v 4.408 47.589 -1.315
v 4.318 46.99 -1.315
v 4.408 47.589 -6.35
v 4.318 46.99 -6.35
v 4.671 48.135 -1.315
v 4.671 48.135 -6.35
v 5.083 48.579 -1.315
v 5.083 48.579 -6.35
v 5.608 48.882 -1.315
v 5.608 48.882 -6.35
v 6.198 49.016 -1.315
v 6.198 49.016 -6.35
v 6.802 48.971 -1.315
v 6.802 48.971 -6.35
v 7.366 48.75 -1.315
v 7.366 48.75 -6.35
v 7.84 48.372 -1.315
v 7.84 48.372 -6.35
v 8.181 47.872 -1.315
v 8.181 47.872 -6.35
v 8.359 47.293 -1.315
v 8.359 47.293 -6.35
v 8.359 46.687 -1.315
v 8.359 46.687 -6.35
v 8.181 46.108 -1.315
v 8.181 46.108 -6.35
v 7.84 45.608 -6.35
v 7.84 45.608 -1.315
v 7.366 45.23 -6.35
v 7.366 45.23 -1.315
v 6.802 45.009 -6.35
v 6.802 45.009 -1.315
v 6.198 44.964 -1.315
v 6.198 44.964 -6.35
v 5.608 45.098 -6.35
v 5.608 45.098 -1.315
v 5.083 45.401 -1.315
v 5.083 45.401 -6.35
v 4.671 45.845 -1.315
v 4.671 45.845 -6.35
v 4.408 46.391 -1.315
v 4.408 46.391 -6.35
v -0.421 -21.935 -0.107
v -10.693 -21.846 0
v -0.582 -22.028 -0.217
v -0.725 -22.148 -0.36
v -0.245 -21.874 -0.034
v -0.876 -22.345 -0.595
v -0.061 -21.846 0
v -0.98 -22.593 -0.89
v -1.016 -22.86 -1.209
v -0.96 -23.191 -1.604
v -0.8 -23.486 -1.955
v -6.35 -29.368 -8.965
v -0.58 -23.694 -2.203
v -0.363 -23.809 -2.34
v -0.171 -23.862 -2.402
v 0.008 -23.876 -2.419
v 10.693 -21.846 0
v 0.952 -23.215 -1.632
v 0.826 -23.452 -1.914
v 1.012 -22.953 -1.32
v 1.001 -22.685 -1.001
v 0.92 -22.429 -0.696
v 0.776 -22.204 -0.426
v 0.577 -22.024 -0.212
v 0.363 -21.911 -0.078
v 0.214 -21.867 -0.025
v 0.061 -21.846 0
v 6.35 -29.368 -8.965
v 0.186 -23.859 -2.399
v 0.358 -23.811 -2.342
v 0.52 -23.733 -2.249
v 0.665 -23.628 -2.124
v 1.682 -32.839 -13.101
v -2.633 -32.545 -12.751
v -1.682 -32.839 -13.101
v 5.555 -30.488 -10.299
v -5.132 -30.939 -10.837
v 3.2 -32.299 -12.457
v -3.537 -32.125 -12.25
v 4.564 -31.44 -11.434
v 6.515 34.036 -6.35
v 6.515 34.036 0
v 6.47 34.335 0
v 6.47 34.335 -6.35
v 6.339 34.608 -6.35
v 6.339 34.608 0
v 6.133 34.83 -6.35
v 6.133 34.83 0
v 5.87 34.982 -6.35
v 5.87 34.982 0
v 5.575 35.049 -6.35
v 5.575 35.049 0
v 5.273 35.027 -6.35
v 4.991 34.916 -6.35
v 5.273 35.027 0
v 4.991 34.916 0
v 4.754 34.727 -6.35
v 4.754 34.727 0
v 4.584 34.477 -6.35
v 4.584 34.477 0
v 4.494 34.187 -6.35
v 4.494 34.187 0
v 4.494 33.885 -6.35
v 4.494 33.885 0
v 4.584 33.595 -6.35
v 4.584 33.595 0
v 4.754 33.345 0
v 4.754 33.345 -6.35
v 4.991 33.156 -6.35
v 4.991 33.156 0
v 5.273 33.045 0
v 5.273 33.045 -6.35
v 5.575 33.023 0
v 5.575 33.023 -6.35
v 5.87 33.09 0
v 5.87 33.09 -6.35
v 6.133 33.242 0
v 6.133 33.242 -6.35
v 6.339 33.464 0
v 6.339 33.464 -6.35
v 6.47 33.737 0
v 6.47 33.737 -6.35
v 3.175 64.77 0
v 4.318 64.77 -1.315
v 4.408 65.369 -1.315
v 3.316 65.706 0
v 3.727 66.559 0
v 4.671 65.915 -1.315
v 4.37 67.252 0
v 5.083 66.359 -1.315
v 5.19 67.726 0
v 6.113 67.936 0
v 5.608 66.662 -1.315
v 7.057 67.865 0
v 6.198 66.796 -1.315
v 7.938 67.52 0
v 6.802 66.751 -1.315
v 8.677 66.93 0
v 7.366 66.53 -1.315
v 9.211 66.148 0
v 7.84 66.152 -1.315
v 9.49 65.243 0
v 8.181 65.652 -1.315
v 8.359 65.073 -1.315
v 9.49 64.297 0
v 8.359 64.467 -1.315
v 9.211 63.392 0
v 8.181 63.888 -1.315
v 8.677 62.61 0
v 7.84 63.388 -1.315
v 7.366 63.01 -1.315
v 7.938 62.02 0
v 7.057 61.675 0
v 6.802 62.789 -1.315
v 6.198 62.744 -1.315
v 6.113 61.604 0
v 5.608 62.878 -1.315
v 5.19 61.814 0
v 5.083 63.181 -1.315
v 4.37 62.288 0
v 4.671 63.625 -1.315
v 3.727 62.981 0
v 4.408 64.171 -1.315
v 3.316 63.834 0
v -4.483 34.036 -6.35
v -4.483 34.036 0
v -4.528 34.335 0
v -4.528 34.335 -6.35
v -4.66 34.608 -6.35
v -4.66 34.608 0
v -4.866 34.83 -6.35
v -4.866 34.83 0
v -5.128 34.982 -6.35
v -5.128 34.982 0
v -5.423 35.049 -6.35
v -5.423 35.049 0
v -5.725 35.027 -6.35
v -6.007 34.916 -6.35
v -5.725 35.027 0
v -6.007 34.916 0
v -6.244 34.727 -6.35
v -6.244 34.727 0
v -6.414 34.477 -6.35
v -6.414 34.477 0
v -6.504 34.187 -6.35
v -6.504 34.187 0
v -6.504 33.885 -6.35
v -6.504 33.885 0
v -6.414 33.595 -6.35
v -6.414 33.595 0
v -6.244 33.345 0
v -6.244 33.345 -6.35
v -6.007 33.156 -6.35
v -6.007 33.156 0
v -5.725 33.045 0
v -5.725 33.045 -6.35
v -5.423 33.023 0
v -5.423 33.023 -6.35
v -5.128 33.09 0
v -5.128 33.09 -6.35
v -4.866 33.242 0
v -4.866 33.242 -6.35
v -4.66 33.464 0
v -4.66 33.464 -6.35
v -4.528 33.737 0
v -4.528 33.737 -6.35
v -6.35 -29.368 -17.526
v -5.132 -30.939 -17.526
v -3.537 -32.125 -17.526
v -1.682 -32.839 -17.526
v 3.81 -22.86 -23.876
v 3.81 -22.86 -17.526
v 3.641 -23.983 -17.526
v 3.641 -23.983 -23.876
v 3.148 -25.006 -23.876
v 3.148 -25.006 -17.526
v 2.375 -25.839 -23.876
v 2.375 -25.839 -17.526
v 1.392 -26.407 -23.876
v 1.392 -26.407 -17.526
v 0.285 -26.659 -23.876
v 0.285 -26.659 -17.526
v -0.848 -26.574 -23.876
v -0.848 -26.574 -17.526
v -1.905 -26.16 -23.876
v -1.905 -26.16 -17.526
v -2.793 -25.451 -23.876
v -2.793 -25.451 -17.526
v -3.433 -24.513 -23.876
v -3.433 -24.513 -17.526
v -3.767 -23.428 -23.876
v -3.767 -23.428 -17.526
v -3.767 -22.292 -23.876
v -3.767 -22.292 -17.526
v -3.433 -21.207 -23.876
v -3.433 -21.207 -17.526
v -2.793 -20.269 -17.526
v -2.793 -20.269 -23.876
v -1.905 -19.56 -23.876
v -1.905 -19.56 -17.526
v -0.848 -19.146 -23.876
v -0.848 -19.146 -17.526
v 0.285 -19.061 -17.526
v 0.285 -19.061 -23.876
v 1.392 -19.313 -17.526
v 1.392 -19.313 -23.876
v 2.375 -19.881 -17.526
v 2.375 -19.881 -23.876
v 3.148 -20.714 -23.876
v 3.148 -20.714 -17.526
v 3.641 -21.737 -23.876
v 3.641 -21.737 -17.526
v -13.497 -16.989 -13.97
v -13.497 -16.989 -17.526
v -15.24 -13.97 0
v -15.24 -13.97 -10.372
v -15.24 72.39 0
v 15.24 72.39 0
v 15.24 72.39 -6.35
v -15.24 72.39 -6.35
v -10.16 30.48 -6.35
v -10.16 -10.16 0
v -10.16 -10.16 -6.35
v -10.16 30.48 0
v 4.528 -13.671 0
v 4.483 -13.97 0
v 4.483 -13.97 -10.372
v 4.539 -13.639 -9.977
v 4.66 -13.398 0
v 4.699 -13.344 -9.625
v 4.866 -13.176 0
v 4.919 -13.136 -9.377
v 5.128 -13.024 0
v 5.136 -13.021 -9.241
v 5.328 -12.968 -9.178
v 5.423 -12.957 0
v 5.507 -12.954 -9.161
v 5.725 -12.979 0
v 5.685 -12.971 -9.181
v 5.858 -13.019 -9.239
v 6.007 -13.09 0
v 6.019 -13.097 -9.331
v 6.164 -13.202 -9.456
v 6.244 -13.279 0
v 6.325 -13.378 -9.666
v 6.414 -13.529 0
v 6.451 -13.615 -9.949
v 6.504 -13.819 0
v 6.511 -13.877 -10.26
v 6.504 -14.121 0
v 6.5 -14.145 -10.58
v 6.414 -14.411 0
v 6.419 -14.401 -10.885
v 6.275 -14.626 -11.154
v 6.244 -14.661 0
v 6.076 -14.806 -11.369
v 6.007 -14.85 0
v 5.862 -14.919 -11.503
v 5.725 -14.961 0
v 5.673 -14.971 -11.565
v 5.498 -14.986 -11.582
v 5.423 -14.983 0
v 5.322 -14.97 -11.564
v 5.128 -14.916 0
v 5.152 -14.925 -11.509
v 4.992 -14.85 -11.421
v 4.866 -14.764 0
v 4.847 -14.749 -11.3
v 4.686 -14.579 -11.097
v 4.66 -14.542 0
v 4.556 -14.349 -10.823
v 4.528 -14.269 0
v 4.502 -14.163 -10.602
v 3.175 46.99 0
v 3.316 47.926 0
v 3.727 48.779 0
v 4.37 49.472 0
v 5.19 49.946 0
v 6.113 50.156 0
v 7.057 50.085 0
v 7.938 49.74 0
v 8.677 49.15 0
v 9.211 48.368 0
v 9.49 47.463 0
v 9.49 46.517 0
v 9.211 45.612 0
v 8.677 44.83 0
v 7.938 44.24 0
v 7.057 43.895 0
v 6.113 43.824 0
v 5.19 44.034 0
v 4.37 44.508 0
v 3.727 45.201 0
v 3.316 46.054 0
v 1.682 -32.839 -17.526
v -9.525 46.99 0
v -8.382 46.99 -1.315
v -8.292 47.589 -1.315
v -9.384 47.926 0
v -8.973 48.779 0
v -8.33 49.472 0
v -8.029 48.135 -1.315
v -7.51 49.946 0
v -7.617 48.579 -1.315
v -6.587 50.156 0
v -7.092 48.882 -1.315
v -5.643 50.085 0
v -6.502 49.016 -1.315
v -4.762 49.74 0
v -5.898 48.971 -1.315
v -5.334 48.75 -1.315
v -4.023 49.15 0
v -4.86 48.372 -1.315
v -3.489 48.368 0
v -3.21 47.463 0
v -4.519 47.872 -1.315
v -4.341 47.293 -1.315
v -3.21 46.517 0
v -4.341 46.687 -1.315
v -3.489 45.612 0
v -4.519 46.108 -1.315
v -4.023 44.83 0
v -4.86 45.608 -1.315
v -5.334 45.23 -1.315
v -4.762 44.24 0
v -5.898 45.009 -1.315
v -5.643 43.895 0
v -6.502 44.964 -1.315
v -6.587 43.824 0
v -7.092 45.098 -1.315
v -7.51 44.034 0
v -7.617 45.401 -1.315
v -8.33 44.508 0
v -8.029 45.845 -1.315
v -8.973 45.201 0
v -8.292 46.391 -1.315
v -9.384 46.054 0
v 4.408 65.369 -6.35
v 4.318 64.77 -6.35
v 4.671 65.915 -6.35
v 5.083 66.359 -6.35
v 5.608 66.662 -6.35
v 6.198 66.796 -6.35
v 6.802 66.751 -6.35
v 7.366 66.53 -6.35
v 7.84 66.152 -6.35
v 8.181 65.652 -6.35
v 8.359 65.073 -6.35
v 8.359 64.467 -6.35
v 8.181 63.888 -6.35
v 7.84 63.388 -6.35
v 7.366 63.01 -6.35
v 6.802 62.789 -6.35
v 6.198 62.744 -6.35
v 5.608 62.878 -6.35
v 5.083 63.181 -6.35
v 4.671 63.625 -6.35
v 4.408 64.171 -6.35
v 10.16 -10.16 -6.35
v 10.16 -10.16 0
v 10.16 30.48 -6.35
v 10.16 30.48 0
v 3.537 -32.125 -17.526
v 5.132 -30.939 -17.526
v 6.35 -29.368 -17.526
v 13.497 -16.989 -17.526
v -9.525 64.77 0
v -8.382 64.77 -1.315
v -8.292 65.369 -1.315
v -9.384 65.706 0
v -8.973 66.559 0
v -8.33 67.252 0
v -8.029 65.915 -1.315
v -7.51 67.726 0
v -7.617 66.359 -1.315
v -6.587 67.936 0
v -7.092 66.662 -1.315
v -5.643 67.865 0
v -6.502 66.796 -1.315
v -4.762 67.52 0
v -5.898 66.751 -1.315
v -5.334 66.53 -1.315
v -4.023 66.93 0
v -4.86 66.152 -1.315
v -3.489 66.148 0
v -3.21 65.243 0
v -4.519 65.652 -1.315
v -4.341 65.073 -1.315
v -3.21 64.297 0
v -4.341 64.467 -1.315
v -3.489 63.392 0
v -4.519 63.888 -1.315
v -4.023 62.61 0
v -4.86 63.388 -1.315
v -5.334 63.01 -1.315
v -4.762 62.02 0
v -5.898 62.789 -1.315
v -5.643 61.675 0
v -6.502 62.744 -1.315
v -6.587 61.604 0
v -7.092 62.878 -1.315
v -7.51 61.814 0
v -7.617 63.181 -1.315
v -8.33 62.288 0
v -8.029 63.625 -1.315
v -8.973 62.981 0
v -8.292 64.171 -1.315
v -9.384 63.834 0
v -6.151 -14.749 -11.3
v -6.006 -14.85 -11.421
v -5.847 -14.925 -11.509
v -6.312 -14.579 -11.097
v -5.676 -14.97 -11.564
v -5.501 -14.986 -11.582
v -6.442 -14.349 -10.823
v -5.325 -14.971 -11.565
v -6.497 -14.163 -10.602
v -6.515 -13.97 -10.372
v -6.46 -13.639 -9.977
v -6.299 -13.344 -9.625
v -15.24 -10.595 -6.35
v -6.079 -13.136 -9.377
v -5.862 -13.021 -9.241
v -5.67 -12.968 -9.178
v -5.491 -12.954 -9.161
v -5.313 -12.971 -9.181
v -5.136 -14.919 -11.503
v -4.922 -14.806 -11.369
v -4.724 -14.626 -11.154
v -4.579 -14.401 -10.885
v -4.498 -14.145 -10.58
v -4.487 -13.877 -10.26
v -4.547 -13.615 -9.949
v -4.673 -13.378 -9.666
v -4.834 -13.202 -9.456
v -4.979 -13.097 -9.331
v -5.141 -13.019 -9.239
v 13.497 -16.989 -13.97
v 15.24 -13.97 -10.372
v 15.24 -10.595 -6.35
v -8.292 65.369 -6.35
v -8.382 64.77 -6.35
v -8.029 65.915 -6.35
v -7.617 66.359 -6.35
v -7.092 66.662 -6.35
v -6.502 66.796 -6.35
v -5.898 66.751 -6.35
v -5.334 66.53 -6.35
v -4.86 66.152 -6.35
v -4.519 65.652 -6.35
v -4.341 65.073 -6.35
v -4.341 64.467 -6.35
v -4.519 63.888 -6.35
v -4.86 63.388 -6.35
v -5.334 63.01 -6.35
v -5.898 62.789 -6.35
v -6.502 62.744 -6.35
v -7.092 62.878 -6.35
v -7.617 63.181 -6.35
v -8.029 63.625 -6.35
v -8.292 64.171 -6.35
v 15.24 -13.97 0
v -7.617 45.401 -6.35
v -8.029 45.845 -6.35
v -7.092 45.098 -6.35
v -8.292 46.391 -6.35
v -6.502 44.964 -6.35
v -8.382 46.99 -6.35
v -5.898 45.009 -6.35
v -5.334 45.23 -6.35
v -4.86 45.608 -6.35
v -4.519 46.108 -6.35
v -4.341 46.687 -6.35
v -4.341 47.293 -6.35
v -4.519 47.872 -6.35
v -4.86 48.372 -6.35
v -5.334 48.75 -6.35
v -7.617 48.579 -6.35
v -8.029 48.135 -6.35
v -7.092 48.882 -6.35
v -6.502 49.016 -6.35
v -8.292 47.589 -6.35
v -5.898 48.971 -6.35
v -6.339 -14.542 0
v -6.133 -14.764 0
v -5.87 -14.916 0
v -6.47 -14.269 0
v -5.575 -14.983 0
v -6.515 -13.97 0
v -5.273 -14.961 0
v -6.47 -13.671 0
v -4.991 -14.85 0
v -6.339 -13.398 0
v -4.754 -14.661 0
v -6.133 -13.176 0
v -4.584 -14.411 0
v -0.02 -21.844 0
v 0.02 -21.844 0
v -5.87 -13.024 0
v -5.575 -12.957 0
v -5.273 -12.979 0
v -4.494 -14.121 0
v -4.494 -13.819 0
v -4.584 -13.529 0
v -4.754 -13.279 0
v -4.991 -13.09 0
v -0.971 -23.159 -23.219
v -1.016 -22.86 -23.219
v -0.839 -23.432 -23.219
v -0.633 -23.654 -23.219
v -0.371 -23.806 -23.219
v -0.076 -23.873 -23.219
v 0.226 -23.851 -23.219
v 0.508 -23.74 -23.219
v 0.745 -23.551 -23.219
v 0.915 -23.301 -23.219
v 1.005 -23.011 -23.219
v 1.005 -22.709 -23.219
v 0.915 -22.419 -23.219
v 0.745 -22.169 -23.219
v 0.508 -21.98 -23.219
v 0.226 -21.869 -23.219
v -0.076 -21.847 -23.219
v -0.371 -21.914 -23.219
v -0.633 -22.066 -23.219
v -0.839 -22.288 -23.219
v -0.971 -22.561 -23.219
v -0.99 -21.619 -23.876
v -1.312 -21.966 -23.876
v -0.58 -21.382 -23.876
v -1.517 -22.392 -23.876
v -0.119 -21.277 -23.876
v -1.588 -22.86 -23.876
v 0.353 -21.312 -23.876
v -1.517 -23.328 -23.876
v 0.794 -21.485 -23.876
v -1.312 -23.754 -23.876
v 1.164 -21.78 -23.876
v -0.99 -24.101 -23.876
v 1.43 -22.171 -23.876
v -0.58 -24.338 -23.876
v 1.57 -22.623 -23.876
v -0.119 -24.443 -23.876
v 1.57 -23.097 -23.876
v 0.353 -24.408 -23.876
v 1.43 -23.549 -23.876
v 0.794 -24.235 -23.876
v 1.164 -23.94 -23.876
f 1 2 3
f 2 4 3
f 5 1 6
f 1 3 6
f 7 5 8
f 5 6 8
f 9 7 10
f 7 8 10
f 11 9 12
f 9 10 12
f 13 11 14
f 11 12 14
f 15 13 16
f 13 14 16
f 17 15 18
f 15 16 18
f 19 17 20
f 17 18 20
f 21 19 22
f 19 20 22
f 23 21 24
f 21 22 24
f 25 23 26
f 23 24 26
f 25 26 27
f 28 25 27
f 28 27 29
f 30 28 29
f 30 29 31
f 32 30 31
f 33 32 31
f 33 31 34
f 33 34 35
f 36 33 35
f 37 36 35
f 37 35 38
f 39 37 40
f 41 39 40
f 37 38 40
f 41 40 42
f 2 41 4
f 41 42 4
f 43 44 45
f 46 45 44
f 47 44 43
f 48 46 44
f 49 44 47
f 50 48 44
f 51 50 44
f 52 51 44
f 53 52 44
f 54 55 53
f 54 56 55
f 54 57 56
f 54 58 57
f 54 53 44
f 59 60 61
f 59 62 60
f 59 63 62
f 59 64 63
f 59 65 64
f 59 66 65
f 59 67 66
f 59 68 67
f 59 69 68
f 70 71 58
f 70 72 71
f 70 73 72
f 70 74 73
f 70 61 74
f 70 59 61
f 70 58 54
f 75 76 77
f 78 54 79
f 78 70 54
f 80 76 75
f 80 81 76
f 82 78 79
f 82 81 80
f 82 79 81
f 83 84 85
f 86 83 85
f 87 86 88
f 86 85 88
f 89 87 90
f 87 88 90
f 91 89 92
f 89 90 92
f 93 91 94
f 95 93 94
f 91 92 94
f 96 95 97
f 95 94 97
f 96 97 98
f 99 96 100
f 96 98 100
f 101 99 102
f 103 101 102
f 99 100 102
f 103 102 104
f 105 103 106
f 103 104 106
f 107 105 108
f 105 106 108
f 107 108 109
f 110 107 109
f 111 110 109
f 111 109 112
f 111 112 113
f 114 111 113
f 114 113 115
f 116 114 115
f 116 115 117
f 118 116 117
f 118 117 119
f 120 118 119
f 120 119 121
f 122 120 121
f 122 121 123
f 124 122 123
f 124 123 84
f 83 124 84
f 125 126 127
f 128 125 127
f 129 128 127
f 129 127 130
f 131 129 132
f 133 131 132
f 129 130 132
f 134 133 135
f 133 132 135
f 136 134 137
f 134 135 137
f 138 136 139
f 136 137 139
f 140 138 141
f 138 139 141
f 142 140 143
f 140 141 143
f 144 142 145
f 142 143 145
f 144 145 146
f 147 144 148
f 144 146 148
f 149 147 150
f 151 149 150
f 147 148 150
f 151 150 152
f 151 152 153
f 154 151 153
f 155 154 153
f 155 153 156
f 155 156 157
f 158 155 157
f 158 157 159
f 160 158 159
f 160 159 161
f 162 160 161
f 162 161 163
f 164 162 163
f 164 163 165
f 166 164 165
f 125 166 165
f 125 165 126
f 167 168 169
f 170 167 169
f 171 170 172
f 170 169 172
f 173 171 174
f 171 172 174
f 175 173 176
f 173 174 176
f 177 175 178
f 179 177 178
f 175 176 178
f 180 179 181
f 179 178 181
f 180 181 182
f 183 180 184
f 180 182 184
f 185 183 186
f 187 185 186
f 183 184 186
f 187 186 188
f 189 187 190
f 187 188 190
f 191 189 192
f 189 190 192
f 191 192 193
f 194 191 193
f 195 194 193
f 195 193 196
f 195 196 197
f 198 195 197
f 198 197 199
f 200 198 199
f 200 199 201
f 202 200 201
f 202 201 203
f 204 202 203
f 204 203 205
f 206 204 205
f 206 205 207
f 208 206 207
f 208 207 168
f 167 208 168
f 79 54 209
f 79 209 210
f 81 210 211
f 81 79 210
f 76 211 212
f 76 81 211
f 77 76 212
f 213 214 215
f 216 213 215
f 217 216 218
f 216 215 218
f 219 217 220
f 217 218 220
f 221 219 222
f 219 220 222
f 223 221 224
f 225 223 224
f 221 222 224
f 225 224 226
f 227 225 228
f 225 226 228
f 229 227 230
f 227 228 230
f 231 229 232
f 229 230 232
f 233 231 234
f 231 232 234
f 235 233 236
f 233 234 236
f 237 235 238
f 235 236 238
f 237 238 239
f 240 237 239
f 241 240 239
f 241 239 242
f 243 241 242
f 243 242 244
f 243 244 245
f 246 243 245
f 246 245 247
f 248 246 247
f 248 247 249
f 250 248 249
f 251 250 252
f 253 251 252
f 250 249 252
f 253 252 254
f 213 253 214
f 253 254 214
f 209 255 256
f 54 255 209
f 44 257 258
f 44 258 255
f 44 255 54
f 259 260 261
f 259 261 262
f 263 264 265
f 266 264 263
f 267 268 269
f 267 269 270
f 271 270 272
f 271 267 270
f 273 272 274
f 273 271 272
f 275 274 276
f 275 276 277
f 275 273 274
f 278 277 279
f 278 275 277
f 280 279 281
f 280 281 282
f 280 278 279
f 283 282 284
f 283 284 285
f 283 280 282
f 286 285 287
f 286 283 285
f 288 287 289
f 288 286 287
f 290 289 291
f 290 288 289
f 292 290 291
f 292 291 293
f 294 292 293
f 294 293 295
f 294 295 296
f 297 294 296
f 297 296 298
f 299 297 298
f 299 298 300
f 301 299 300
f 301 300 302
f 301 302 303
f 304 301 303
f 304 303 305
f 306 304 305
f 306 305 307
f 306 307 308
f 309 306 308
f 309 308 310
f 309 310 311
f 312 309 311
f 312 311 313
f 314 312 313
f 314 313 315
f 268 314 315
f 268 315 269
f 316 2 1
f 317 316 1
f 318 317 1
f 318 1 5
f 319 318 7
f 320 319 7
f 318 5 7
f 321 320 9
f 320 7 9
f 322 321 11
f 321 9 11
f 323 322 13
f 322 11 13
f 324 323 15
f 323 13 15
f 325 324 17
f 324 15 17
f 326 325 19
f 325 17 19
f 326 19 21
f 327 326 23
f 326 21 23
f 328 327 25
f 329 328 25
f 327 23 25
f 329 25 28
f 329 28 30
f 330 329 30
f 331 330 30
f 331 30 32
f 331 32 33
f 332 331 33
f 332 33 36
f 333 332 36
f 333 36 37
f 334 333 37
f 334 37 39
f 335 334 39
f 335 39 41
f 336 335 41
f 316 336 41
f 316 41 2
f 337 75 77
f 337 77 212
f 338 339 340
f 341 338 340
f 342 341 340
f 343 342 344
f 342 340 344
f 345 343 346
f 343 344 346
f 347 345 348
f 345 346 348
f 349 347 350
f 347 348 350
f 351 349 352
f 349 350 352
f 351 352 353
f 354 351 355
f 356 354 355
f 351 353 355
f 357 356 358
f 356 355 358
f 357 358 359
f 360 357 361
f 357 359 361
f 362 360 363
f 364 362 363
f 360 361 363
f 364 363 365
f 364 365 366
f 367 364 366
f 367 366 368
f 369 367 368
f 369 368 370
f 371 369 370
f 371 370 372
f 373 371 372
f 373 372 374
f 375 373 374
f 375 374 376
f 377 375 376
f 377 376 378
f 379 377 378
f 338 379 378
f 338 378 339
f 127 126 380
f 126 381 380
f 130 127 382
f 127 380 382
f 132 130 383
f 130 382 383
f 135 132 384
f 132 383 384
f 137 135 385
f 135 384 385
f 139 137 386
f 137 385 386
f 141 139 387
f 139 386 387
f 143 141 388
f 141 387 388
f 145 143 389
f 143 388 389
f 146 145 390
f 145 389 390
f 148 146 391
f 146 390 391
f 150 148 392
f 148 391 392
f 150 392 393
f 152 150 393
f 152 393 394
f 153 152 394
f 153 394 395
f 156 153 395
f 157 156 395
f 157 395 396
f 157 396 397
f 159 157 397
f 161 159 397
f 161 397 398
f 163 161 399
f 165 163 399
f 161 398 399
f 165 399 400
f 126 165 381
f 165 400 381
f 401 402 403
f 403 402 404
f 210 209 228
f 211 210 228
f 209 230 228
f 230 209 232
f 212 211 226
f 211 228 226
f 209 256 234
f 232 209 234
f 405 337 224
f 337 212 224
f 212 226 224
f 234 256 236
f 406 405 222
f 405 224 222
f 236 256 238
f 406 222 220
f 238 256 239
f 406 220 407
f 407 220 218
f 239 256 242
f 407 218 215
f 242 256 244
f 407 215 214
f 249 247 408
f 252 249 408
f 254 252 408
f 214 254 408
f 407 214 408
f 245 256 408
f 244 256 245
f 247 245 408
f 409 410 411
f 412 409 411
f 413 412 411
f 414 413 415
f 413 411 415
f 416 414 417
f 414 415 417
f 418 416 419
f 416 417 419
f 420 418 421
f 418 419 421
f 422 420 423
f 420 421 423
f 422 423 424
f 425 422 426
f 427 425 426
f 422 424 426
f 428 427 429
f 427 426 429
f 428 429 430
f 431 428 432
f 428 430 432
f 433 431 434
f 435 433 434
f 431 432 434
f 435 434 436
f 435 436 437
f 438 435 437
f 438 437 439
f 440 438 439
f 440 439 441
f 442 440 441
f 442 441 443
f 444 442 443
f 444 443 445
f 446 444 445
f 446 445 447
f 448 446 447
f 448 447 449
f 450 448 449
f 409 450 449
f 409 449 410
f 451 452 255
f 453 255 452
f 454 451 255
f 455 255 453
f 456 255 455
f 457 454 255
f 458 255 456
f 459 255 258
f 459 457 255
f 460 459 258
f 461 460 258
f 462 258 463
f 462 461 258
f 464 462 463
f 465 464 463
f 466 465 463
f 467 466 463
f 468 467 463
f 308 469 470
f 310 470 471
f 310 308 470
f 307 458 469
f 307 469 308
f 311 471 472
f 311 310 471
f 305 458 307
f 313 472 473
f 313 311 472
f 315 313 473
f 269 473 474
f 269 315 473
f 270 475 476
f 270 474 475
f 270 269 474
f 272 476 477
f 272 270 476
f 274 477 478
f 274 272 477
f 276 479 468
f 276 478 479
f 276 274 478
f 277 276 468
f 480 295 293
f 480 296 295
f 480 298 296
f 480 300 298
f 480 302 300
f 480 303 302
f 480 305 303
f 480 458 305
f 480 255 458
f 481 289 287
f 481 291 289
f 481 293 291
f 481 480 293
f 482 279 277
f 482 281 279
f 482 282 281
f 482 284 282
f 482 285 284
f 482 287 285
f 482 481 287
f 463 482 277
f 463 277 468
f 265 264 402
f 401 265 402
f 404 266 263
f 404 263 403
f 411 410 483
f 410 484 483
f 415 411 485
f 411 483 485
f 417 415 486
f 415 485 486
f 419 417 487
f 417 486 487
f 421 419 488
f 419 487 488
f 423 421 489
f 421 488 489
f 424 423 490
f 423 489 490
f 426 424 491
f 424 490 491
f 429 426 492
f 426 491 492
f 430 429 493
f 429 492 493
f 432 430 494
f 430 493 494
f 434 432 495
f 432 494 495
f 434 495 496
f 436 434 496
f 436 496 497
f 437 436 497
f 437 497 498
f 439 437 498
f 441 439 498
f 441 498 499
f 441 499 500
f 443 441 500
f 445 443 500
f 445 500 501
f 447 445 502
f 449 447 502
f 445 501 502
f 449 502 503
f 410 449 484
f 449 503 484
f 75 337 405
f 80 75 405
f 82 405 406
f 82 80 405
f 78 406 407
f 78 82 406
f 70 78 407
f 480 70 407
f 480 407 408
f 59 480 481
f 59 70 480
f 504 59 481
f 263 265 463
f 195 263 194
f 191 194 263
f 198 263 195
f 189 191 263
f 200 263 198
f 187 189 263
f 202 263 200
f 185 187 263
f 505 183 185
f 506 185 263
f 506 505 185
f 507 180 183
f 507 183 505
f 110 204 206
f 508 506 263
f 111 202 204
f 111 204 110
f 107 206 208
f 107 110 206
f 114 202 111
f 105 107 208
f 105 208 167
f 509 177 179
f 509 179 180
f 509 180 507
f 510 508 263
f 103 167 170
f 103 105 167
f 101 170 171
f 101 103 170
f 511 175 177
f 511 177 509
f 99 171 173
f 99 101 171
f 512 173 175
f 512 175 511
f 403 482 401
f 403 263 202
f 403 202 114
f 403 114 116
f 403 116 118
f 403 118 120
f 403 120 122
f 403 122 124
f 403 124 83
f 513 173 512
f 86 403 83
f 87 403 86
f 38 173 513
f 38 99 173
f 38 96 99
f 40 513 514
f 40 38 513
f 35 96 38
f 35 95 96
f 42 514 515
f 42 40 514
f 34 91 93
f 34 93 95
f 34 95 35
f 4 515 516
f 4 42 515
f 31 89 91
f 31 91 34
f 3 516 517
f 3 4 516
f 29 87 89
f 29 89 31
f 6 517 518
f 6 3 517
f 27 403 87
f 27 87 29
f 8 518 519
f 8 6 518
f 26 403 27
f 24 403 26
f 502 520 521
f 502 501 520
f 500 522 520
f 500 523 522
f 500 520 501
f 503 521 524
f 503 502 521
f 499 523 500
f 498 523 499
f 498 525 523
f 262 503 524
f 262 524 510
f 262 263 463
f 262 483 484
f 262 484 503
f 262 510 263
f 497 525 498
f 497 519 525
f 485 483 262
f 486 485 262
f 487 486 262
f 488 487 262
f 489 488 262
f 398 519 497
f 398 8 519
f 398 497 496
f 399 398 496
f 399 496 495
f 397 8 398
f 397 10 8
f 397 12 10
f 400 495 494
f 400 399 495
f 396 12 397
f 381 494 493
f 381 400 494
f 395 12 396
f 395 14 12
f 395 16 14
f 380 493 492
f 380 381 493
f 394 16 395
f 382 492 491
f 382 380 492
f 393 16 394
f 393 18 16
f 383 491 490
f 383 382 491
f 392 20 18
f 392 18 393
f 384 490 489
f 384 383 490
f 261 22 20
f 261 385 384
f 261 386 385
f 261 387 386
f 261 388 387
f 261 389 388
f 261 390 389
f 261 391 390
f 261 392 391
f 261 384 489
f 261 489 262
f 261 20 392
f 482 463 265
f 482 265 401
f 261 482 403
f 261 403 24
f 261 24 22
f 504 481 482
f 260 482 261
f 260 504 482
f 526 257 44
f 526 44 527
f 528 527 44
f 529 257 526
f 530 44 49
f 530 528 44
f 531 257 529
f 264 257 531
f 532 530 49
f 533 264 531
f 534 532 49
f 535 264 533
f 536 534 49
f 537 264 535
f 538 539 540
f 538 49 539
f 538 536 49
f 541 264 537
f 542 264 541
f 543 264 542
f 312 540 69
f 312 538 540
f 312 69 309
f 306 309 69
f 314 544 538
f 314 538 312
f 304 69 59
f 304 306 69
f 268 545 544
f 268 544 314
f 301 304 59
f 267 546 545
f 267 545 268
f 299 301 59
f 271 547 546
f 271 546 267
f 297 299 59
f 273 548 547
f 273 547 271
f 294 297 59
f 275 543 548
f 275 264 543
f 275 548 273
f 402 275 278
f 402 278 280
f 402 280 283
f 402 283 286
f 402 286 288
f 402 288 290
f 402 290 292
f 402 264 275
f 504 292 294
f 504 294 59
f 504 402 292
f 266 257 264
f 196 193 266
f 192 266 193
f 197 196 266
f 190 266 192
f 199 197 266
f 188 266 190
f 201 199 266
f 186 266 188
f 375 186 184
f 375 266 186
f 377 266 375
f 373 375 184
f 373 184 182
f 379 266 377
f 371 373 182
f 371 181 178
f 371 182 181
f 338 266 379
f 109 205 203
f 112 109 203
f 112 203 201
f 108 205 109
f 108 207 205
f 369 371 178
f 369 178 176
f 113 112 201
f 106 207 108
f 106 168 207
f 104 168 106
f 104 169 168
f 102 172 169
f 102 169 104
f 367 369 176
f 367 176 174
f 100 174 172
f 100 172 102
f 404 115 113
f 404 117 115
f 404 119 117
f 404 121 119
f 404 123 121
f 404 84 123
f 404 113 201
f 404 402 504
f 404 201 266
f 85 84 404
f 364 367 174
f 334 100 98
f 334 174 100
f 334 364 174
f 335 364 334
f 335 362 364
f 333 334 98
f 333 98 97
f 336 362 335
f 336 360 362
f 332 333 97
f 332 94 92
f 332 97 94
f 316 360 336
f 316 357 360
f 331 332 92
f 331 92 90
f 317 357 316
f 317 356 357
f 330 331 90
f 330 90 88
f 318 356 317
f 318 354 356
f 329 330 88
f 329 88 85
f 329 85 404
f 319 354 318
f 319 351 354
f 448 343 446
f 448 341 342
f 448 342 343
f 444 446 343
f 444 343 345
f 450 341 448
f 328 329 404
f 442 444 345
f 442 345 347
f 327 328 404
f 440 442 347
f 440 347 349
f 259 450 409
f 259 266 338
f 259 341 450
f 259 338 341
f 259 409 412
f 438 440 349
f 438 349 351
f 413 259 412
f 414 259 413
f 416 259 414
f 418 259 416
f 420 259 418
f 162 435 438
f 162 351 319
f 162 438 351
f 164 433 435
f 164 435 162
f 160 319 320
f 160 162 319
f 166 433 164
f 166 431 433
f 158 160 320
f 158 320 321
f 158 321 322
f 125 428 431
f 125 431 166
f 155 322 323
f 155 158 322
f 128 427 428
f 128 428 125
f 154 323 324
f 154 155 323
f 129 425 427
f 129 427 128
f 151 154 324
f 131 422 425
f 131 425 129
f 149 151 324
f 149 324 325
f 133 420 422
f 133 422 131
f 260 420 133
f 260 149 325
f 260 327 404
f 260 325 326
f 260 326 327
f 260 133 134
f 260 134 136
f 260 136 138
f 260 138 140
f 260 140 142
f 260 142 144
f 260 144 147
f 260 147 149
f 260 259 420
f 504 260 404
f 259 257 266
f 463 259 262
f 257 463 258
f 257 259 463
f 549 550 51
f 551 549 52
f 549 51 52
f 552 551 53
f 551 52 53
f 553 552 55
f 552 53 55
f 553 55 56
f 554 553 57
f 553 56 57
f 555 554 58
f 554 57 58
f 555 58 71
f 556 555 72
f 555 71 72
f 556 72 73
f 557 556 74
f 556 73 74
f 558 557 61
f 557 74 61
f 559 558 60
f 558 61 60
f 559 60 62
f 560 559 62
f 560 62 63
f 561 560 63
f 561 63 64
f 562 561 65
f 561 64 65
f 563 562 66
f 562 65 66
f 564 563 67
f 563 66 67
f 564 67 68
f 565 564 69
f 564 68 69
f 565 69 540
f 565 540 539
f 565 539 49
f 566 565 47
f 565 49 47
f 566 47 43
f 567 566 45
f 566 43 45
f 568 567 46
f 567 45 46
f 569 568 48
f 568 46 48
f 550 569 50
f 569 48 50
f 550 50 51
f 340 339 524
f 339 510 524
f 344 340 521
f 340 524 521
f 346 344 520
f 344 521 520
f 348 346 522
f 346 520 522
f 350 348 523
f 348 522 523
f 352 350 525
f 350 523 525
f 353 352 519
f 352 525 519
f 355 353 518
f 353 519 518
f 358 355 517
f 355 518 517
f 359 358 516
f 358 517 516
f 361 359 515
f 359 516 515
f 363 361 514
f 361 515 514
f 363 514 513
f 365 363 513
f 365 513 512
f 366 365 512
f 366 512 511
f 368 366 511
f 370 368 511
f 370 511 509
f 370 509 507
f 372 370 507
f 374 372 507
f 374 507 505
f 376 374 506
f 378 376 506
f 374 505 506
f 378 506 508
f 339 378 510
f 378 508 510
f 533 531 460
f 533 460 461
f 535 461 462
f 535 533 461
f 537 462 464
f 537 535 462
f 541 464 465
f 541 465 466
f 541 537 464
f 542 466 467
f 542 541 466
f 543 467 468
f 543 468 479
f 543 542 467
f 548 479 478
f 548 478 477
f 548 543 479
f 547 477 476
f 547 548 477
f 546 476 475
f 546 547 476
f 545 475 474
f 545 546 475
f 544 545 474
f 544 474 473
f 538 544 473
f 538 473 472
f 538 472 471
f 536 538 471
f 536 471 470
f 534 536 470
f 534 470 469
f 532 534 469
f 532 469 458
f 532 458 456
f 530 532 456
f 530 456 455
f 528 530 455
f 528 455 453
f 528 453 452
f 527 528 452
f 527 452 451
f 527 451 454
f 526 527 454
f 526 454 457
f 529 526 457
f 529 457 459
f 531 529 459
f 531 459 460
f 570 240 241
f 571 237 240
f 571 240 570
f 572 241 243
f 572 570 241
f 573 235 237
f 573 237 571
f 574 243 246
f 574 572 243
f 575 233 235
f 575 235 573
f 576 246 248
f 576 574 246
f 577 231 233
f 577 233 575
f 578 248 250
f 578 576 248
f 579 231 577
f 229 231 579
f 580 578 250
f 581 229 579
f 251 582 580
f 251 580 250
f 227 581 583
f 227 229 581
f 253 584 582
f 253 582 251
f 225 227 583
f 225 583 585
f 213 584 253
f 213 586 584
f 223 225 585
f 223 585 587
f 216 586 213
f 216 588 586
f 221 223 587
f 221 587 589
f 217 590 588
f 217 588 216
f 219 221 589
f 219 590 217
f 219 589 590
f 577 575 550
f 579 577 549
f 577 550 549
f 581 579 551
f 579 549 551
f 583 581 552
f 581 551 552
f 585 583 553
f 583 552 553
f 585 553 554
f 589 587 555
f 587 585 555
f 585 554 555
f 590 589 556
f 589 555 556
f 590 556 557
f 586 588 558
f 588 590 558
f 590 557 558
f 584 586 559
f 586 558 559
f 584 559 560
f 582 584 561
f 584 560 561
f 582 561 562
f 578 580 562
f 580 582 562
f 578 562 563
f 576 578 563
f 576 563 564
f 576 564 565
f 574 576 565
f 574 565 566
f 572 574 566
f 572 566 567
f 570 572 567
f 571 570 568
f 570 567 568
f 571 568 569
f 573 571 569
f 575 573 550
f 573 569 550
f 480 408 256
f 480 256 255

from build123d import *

# Parameters (mm, degrees)
F0_W           = 20.32
F0_H           = 40.64
F0_R           = 1.016
F0_W_2         = 15.24
F0_H_2         = 31.75
F2_DEPTH       = 17.526
F1_W           = 43.174938
F1_H           = 6.35
F3_DEPTH       = 127
F4_R           = 3.81
F5_DEPTH       = 6.35
F7_D           = 2.032
F7_CSINK_D     = 3.175
F7_CSINK_ANGLE = 82
F8_D           = 4.064
F8_CSINK_D     = 6.35
F8_CSINK_ANGLE = 82


with BuildPart() as f2:
    # F0 (on Top) → F2 (new body, through all)
    with BuildSketch(Plane.XY):
        with BuildLine():
            Line((6.35, -29.367932), (15.24, -13.97))
            Line((15.24, -13.97), (6.5151, -13.97))
            ThreePointArc((6.5151, -13.97), (5.4991, -14.986), (4.4831, -13.97))
            Line((4.4831, -13.97), (-4.4831, -13.97))
            ThreePointArc((-4.4831, -13.97), (-5.4991, -14.986), (-6.5151, -13.97))
            Line((-6.5151, -13.97), (-15.24, -13.97))
            Line((-15.24, -13.97), (-6.35, -29.367932))
            ThreePointArc((-6.35, -29.367932), (0, -33.034106), (6.35, -29.367932))
        make_face()
        with BuildLine():
            Line((6.5151, -13.97), (15.24, -13.97))
            Line((15.24, -13.97), (15.24, 40.64))
            Line((15.24, 40.64), (0, 40.64))
            Line((0, 40.64), (-15.24, 40.64))
            Line((-15.24, 40.64), (-15.24, -13.97))
            Line((-15.24, -13.97), (-6.5151, -13.97))
            ThreePointArc((-6.5151, -13.97), (-5.4991, -12.954), (-4.4831, -13.97))
            Line((-4.4831, -13.97), (4.4831, -13.97))
            ThreePointArc((4.4831, -13.97), (5.4991, -12.954), (6.5151, -13.97))
        make_face()
        with Locations((0, 10.16)):
            Rectangle(F0_W, F0_H, mode=Mode.SUBTRACT)
        with Locations((-5.4991, 34.036)):
            Circle(F0_R, mode=Mode.SUBTRACT)
        with Locations((5.4991, 34.036)):
            Circle(F0_R, mode=Mode.SUBTRACT)
        with Locations((7.62, 56.515)):
            Rectangle(F0_W_2, F0_H_2)
        with Locations((-7.62, 56.515)):
            Rectangle(F0_W_2, F0_H_2)
    extrude(amount=-F2_DEPTH)

    # F1 (on Right) → F3 (intersect, symmetric)
    with BuildSketch(Plane.YZ):
        Polygon((40.64, -6.35), (40.64, 0), (-21.845814, 0), (-32.838694, -13.100805), (-32.838694, -13.97), (-32.838694, -17.526), (-16.989363, -17.526), (-16.989363, -13.97), (-10.595424, -6.35), align=None)
        with Locations((62.227469, -3.175)):
            Rectangle(F1_W, F1_H)
    extrude(amount=F3_DEPTH, both=True, mode=Mode.INTERSECT)

    # F4 (on face) → F5 (join)
    with BuildSketch(Plane(origin=(0, 0, -17.526), x_dir=(1, 0, 0), z_dir=(0, 0, -1))):
        with Locations((0, 22.86)):
            Circle(F4_R)
    extrude(amount=F5_DEPTH)

    # F7 (through all)
    with Locations(Plane(origin=(0, 0, -23.876), x_dir=(1, 0, 0), z_dir=(0, 0, -1))):
        with Locations((0, 22.86)):
            CounterSinkHole(F7_D / 2, F7_CSINK_D / 2, counter_sink_angle=F7_CSINK_ANGLE)

    # F8 (through all)
    with Locations(Plane.XY):
        with Locations((6.35, 46.99), (-6.35, 46.99), (-6.35, 64.77), (6.35, 64.77)):
            CounterSinkHole(F8_D / 2, F8_CSINK_D / 2, counter_sink_angle=F8_CSINK_ANGLE)


solid = f2.part
